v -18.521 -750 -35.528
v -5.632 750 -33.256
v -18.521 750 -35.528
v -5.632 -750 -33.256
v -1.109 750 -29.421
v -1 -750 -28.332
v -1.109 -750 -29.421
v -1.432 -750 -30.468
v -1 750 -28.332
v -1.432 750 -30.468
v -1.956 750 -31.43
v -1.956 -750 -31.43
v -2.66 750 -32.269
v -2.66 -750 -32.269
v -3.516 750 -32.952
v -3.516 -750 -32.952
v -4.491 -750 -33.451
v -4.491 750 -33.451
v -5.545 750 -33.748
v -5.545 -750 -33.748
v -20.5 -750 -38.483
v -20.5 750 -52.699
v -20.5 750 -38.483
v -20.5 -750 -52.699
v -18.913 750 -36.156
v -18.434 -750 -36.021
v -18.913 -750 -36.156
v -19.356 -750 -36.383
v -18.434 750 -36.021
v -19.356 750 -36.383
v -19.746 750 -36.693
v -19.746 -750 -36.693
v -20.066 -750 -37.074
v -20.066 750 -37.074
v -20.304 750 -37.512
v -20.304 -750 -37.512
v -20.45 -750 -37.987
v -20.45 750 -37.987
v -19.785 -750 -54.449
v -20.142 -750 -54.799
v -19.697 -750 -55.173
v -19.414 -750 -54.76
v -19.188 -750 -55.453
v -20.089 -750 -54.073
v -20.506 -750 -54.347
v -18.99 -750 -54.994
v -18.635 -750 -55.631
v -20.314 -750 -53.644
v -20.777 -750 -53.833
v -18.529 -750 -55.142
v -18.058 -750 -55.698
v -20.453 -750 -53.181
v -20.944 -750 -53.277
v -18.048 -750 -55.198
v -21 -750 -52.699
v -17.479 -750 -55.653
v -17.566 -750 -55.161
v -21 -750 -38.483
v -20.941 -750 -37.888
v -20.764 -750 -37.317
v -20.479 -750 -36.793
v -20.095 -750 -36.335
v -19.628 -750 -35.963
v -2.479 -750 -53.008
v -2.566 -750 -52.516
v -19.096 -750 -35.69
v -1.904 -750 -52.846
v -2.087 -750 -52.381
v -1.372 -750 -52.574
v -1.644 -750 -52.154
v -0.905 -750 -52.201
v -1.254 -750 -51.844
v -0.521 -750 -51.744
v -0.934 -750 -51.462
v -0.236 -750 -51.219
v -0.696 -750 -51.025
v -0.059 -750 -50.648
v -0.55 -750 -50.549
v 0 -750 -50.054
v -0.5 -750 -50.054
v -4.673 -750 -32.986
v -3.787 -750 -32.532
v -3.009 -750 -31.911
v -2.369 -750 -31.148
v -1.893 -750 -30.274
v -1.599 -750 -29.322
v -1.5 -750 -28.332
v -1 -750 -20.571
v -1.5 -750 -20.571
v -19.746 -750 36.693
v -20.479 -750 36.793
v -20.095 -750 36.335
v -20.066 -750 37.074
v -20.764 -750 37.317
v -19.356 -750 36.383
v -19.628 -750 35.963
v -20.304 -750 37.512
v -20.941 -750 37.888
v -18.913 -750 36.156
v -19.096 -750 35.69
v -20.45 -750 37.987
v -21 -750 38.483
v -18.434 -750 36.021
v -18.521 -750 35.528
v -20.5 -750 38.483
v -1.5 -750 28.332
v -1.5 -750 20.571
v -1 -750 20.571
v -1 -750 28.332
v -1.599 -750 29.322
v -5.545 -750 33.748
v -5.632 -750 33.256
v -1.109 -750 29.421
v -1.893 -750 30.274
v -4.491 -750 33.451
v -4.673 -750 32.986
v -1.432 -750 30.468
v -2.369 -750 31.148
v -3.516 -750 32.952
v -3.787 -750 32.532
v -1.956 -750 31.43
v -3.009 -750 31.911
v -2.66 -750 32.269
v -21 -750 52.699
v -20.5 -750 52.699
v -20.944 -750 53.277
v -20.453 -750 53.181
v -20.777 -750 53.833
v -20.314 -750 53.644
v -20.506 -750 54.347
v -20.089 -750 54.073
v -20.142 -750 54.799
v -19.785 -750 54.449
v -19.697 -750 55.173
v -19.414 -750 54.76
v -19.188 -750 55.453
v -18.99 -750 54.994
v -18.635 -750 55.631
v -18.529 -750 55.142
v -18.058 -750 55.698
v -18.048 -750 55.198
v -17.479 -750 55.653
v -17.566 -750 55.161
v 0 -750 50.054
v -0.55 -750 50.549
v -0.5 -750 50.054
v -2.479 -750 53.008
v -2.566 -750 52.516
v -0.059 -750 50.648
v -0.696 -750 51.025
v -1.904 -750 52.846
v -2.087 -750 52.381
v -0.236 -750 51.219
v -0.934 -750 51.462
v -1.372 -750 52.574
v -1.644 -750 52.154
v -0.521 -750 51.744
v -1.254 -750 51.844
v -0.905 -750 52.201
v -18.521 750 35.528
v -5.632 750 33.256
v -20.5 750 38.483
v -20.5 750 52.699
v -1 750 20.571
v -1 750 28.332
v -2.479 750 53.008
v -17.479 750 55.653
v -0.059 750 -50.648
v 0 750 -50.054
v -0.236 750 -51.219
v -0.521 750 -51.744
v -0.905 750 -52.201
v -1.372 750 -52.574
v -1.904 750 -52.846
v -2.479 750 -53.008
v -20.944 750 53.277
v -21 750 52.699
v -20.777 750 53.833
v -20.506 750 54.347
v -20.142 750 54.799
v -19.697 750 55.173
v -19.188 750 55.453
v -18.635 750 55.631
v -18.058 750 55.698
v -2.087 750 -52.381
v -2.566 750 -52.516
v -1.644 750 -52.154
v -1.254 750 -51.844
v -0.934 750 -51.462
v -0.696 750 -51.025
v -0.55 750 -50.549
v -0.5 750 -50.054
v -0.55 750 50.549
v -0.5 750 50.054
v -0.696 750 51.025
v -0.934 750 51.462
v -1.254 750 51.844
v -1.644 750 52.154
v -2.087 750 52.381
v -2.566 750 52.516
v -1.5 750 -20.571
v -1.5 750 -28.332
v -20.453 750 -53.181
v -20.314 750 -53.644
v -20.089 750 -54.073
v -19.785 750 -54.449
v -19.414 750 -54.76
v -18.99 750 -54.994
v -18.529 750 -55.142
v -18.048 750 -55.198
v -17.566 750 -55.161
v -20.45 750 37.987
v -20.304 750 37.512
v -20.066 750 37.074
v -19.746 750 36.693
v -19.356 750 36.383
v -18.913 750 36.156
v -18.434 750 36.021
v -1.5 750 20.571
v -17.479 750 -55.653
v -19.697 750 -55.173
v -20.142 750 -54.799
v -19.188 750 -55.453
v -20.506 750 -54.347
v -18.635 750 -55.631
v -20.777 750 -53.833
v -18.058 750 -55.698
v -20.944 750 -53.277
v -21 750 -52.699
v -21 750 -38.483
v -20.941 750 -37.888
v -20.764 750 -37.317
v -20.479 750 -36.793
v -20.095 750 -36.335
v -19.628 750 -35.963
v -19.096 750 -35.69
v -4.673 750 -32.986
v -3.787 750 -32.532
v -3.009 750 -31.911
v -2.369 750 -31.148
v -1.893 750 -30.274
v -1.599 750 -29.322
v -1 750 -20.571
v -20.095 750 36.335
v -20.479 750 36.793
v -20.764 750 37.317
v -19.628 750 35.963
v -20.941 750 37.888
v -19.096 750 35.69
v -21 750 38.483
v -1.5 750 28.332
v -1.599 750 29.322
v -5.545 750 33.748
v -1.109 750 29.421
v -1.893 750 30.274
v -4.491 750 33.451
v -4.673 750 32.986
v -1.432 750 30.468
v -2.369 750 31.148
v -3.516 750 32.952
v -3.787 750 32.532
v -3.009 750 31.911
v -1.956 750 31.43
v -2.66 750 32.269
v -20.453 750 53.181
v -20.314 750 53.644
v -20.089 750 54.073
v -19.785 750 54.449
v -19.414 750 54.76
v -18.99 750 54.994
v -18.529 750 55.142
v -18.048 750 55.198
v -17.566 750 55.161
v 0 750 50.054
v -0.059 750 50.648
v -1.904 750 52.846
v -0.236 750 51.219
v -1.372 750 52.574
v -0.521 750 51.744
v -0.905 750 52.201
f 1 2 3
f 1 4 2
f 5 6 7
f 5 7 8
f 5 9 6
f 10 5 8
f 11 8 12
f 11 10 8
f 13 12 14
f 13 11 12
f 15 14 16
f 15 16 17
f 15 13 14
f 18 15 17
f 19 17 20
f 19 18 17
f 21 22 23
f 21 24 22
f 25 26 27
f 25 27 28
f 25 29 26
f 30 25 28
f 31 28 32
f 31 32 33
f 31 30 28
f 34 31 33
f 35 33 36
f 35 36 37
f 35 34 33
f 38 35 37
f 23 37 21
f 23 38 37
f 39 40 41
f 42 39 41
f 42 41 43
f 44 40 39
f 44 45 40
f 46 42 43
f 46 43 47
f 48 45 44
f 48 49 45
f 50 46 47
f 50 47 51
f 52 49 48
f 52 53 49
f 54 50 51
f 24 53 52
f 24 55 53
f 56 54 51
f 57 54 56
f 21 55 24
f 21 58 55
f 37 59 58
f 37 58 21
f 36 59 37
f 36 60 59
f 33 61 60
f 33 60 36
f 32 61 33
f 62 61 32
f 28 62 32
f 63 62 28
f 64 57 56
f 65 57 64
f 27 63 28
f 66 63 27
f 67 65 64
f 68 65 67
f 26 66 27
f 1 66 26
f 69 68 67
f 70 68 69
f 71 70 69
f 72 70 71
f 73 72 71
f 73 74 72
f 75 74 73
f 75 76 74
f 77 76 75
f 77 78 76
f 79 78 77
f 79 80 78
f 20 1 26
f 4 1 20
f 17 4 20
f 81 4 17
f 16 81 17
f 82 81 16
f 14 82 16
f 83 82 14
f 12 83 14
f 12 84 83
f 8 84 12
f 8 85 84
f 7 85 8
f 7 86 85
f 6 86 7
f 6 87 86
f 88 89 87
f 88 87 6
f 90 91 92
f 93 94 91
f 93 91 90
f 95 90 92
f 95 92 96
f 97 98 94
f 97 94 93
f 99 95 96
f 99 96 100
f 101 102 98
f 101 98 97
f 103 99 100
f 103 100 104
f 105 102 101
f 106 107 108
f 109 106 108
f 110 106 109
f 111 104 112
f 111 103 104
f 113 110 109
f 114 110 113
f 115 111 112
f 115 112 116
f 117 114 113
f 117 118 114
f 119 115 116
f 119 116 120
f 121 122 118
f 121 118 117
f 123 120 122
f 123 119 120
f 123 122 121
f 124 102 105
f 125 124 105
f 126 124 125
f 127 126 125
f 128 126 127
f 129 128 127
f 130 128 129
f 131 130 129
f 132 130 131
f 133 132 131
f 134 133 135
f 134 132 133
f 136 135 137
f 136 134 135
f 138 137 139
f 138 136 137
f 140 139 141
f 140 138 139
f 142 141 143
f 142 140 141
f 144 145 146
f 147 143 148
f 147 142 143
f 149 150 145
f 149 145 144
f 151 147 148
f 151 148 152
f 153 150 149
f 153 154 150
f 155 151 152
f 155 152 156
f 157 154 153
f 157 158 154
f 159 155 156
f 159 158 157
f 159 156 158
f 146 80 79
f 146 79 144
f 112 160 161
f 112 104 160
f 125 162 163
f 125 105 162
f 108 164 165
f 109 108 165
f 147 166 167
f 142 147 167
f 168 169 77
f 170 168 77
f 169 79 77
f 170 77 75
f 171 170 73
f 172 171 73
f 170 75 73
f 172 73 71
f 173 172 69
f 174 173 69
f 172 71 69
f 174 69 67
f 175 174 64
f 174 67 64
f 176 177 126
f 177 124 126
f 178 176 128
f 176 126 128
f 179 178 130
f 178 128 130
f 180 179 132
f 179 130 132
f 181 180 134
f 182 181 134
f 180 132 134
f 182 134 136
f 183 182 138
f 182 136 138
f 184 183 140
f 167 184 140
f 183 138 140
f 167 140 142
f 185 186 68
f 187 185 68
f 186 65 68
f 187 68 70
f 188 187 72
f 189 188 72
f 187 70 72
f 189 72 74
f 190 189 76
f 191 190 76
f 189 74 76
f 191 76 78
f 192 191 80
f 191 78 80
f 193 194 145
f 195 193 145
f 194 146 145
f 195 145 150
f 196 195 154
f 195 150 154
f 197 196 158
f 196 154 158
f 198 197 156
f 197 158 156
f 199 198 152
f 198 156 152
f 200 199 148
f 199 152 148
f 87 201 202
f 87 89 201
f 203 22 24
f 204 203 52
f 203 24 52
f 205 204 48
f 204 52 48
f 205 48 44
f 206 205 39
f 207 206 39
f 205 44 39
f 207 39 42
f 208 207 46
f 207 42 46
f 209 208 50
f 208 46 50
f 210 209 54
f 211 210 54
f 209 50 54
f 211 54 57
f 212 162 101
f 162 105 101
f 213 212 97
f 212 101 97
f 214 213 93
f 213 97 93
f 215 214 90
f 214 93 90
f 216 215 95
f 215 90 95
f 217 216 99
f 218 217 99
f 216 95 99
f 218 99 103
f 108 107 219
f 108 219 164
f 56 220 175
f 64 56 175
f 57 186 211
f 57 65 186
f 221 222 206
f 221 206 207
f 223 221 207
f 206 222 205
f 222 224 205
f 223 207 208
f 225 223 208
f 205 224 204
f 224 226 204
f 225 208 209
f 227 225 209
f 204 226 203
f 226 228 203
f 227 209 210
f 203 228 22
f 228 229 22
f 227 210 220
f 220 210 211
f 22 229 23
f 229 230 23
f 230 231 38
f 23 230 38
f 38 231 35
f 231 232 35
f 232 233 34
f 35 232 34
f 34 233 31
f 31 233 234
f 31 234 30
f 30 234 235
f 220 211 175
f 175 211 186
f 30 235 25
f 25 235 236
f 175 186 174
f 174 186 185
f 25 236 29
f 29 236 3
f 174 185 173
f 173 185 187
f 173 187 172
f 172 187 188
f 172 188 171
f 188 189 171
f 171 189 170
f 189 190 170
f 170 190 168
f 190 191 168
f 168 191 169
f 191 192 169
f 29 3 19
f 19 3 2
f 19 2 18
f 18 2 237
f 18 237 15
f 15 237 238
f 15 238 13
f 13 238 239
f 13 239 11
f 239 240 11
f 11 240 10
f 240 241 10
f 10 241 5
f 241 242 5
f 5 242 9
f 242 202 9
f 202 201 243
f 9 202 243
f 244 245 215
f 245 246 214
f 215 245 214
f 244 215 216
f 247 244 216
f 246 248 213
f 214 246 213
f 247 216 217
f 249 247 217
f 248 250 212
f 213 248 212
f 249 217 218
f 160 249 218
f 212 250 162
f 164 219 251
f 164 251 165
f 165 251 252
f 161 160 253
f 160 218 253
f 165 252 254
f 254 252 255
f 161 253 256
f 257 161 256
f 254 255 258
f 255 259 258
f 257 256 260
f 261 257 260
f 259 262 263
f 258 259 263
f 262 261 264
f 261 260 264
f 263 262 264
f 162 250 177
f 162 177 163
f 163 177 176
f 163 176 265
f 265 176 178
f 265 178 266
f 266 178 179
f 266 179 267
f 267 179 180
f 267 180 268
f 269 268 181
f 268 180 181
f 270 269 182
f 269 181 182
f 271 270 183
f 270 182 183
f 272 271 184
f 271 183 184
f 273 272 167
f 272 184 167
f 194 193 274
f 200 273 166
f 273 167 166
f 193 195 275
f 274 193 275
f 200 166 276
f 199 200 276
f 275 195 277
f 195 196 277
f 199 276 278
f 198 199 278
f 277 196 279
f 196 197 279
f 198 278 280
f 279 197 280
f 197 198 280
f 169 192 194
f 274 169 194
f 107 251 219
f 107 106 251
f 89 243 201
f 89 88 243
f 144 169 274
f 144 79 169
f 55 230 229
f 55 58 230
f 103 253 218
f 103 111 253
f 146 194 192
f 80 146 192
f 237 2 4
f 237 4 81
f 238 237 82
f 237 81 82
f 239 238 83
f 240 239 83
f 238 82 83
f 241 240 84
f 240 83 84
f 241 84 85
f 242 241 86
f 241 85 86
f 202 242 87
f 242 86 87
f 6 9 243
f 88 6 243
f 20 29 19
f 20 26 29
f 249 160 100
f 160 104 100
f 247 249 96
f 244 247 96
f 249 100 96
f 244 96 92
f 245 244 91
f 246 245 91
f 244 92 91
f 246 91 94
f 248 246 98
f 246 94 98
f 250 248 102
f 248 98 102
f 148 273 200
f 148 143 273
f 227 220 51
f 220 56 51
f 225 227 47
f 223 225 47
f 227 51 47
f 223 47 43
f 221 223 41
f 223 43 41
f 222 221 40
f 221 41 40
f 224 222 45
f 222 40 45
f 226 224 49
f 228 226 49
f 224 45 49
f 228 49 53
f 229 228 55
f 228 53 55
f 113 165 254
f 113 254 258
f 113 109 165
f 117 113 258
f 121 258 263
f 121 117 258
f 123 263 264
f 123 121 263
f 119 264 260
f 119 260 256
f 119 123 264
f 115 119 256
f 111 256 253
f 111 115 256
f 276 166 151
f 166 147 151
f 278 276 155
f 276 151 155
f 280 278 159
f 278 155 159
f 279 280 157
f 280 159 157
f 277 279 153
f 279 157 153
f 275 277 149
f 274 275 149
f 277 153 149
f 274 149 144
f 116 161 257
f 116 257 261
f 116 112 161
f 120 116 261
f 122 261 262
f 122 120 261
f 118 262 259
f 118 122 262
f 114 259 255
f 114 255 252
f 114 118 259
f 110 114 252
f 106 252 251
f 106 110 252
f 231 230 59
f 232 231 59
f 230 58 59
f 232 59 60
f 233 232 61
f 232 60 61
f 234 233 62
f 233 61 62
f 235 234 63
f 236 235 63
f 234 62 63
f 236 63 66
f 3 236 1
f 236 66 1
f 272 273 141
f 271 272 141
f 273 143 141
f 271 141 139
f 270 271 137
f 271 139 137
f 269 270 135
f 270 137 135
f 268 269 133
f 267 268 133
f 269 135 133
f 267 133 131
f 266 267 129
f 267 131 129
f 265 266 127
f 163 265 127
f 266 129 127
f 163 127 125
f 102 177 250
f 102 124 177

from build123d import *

# Parameters (mm, degrees)
F1_DEPTH = 750
F2_R     = 2.5
F3_R     = 3
F4_R     = 5
F5_R     = 5.5


with BuildPart() as f1:
    # F0 (on Front) → F1 (new body, symmetric)
    with BuildSketch(Plane.XZ):
        Polygon((-1, -20.571158), (-1.5, -20.571158), (-1.5, -32.527116), (-21, -35.965492), (-21, -56.274024), (0, -52.571158), (0, 52.571158), (-21, 56.274024), (-21, 35.965492), (-1.5, 32.527116), (-1.5, 20.571158), (-1, 20.571158), (-1, 32.946666), (-20.5, 36.385042), (-20.5, 55.678148), (-0.5, 52.151608), (-0.5, -52.151608), (-20.5, -55.678148), (-20.5, -36.385042), (-1, -32.946666), align=None)
    extrude(amount=F1_DEPTH, both=True)

    # F2
    f2_edges = [f1.edges().sort_by_distance(p)[0] for p in [
        (-0.5, 0, 52.151608),
        (-20.5, 0, 36.385042),
        (-20.5, 0, 55.678148),
        (-20.5, 0, -36.385042),
        (-0.5, 0, -52.151608),
        (-20.5, 0, -55.678148),
    ]]
    fillet(f2_edges, radius=F2_R)

    # F3
    f3_edges = [f1.edges().sort_by_distance(p)[0] for p in [
        (0, 0, 52.571158),
        (-21, 0, 35.965492),
        (-21, 0, 56.274024),
        (-21, 0, -35.965492),
        (-21, 0, -56.274024),
        (0, 0, -52.571158),
    ]]
    fillet(f3_edges, radius=F3_R)

    # F4
    f4_edges = [f1.edges().sort_by_distance(p)[0] for p in [
        (-1.5, 0, 32.527116),
        (-1.5, 0, -32.527116),
    ]]
    fillet(f4_edges, radius=F4_R)

    # F5
    f5_edges = [f1.edges().sort_by_distance(p)[0] for p in [
        (-1, 0, -32.946666),
        (-1, 0, 32.946666),
    ]]
    fillet(f5_edges, radius=F5_R)


solid = f1.part
